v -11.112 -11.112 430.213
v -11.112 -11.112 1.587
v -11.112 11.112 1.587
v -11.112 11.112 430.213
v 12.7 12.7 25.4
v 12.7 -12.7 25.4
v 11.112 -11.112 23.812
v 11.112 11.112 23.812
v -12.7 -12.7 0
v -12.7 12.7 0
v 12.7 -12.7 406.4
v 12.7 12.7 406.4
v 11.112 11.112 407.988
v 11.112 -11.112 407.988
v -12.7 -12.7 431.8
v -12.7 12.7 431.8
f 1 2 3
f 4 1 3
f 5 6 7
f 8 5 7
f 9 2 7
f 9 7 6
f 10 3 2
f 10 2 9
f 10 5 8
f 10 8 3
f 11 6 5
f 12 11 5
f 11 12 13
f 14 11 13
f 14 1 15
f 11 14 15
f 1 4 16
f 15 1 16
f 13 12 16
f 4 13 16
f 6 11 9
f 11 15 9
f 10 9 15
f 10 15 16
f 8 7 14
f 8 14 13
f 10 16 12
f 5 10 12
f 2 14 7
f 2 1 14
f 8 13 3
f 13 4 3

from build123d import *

# Parameters (mm, degrees)
SKETCH1_W           = 25.4
SKETCH1_H           = 25.4
SKETCH1_W_2         = 22.225
SKETCH1_H_2         = 22.225
BOSS_EXTRUDE1_DEPTH = 431.8
CUT_EXTRUDE1_DEPTH  = 433.73281595


with BuildPart() as part:
    # Sketch1 → Boss-Extrude1 (new body)
    with BuildSketch(Plane.XY):
        Rectangle(SKETCH1_W, SKETCH1_H)
        Rectangle(SKETCH1_W_2, SKETCH1_H_2, mode=Mode.SUBTRACT)
    extrude(amount=BOSS_EXTRUDE1_DEPTH)

    # Sketch2 → Cut-Extrude1 (cut, through all)
    with BuildSketch(Plane(origin=(0, 12.7, 0), x_dir=(1, 0, 0), z_dir=(0, 1, 0))):
        Polygon((12.7, 0), (12.7, -25.4), (-12.7, 0), align=None)
    cut_extrude1 = extrude(amount=-CUT_EXTRUDE1_DEPTH, mode=Mode.SUBTRACT)

    # Mirror1: Cut-Extrude1 across plane
    add(cut_extrude1.mirror(Plane.XY.offset(215.9)), mode=Mode.SUBTRACT)


solid = part.part
